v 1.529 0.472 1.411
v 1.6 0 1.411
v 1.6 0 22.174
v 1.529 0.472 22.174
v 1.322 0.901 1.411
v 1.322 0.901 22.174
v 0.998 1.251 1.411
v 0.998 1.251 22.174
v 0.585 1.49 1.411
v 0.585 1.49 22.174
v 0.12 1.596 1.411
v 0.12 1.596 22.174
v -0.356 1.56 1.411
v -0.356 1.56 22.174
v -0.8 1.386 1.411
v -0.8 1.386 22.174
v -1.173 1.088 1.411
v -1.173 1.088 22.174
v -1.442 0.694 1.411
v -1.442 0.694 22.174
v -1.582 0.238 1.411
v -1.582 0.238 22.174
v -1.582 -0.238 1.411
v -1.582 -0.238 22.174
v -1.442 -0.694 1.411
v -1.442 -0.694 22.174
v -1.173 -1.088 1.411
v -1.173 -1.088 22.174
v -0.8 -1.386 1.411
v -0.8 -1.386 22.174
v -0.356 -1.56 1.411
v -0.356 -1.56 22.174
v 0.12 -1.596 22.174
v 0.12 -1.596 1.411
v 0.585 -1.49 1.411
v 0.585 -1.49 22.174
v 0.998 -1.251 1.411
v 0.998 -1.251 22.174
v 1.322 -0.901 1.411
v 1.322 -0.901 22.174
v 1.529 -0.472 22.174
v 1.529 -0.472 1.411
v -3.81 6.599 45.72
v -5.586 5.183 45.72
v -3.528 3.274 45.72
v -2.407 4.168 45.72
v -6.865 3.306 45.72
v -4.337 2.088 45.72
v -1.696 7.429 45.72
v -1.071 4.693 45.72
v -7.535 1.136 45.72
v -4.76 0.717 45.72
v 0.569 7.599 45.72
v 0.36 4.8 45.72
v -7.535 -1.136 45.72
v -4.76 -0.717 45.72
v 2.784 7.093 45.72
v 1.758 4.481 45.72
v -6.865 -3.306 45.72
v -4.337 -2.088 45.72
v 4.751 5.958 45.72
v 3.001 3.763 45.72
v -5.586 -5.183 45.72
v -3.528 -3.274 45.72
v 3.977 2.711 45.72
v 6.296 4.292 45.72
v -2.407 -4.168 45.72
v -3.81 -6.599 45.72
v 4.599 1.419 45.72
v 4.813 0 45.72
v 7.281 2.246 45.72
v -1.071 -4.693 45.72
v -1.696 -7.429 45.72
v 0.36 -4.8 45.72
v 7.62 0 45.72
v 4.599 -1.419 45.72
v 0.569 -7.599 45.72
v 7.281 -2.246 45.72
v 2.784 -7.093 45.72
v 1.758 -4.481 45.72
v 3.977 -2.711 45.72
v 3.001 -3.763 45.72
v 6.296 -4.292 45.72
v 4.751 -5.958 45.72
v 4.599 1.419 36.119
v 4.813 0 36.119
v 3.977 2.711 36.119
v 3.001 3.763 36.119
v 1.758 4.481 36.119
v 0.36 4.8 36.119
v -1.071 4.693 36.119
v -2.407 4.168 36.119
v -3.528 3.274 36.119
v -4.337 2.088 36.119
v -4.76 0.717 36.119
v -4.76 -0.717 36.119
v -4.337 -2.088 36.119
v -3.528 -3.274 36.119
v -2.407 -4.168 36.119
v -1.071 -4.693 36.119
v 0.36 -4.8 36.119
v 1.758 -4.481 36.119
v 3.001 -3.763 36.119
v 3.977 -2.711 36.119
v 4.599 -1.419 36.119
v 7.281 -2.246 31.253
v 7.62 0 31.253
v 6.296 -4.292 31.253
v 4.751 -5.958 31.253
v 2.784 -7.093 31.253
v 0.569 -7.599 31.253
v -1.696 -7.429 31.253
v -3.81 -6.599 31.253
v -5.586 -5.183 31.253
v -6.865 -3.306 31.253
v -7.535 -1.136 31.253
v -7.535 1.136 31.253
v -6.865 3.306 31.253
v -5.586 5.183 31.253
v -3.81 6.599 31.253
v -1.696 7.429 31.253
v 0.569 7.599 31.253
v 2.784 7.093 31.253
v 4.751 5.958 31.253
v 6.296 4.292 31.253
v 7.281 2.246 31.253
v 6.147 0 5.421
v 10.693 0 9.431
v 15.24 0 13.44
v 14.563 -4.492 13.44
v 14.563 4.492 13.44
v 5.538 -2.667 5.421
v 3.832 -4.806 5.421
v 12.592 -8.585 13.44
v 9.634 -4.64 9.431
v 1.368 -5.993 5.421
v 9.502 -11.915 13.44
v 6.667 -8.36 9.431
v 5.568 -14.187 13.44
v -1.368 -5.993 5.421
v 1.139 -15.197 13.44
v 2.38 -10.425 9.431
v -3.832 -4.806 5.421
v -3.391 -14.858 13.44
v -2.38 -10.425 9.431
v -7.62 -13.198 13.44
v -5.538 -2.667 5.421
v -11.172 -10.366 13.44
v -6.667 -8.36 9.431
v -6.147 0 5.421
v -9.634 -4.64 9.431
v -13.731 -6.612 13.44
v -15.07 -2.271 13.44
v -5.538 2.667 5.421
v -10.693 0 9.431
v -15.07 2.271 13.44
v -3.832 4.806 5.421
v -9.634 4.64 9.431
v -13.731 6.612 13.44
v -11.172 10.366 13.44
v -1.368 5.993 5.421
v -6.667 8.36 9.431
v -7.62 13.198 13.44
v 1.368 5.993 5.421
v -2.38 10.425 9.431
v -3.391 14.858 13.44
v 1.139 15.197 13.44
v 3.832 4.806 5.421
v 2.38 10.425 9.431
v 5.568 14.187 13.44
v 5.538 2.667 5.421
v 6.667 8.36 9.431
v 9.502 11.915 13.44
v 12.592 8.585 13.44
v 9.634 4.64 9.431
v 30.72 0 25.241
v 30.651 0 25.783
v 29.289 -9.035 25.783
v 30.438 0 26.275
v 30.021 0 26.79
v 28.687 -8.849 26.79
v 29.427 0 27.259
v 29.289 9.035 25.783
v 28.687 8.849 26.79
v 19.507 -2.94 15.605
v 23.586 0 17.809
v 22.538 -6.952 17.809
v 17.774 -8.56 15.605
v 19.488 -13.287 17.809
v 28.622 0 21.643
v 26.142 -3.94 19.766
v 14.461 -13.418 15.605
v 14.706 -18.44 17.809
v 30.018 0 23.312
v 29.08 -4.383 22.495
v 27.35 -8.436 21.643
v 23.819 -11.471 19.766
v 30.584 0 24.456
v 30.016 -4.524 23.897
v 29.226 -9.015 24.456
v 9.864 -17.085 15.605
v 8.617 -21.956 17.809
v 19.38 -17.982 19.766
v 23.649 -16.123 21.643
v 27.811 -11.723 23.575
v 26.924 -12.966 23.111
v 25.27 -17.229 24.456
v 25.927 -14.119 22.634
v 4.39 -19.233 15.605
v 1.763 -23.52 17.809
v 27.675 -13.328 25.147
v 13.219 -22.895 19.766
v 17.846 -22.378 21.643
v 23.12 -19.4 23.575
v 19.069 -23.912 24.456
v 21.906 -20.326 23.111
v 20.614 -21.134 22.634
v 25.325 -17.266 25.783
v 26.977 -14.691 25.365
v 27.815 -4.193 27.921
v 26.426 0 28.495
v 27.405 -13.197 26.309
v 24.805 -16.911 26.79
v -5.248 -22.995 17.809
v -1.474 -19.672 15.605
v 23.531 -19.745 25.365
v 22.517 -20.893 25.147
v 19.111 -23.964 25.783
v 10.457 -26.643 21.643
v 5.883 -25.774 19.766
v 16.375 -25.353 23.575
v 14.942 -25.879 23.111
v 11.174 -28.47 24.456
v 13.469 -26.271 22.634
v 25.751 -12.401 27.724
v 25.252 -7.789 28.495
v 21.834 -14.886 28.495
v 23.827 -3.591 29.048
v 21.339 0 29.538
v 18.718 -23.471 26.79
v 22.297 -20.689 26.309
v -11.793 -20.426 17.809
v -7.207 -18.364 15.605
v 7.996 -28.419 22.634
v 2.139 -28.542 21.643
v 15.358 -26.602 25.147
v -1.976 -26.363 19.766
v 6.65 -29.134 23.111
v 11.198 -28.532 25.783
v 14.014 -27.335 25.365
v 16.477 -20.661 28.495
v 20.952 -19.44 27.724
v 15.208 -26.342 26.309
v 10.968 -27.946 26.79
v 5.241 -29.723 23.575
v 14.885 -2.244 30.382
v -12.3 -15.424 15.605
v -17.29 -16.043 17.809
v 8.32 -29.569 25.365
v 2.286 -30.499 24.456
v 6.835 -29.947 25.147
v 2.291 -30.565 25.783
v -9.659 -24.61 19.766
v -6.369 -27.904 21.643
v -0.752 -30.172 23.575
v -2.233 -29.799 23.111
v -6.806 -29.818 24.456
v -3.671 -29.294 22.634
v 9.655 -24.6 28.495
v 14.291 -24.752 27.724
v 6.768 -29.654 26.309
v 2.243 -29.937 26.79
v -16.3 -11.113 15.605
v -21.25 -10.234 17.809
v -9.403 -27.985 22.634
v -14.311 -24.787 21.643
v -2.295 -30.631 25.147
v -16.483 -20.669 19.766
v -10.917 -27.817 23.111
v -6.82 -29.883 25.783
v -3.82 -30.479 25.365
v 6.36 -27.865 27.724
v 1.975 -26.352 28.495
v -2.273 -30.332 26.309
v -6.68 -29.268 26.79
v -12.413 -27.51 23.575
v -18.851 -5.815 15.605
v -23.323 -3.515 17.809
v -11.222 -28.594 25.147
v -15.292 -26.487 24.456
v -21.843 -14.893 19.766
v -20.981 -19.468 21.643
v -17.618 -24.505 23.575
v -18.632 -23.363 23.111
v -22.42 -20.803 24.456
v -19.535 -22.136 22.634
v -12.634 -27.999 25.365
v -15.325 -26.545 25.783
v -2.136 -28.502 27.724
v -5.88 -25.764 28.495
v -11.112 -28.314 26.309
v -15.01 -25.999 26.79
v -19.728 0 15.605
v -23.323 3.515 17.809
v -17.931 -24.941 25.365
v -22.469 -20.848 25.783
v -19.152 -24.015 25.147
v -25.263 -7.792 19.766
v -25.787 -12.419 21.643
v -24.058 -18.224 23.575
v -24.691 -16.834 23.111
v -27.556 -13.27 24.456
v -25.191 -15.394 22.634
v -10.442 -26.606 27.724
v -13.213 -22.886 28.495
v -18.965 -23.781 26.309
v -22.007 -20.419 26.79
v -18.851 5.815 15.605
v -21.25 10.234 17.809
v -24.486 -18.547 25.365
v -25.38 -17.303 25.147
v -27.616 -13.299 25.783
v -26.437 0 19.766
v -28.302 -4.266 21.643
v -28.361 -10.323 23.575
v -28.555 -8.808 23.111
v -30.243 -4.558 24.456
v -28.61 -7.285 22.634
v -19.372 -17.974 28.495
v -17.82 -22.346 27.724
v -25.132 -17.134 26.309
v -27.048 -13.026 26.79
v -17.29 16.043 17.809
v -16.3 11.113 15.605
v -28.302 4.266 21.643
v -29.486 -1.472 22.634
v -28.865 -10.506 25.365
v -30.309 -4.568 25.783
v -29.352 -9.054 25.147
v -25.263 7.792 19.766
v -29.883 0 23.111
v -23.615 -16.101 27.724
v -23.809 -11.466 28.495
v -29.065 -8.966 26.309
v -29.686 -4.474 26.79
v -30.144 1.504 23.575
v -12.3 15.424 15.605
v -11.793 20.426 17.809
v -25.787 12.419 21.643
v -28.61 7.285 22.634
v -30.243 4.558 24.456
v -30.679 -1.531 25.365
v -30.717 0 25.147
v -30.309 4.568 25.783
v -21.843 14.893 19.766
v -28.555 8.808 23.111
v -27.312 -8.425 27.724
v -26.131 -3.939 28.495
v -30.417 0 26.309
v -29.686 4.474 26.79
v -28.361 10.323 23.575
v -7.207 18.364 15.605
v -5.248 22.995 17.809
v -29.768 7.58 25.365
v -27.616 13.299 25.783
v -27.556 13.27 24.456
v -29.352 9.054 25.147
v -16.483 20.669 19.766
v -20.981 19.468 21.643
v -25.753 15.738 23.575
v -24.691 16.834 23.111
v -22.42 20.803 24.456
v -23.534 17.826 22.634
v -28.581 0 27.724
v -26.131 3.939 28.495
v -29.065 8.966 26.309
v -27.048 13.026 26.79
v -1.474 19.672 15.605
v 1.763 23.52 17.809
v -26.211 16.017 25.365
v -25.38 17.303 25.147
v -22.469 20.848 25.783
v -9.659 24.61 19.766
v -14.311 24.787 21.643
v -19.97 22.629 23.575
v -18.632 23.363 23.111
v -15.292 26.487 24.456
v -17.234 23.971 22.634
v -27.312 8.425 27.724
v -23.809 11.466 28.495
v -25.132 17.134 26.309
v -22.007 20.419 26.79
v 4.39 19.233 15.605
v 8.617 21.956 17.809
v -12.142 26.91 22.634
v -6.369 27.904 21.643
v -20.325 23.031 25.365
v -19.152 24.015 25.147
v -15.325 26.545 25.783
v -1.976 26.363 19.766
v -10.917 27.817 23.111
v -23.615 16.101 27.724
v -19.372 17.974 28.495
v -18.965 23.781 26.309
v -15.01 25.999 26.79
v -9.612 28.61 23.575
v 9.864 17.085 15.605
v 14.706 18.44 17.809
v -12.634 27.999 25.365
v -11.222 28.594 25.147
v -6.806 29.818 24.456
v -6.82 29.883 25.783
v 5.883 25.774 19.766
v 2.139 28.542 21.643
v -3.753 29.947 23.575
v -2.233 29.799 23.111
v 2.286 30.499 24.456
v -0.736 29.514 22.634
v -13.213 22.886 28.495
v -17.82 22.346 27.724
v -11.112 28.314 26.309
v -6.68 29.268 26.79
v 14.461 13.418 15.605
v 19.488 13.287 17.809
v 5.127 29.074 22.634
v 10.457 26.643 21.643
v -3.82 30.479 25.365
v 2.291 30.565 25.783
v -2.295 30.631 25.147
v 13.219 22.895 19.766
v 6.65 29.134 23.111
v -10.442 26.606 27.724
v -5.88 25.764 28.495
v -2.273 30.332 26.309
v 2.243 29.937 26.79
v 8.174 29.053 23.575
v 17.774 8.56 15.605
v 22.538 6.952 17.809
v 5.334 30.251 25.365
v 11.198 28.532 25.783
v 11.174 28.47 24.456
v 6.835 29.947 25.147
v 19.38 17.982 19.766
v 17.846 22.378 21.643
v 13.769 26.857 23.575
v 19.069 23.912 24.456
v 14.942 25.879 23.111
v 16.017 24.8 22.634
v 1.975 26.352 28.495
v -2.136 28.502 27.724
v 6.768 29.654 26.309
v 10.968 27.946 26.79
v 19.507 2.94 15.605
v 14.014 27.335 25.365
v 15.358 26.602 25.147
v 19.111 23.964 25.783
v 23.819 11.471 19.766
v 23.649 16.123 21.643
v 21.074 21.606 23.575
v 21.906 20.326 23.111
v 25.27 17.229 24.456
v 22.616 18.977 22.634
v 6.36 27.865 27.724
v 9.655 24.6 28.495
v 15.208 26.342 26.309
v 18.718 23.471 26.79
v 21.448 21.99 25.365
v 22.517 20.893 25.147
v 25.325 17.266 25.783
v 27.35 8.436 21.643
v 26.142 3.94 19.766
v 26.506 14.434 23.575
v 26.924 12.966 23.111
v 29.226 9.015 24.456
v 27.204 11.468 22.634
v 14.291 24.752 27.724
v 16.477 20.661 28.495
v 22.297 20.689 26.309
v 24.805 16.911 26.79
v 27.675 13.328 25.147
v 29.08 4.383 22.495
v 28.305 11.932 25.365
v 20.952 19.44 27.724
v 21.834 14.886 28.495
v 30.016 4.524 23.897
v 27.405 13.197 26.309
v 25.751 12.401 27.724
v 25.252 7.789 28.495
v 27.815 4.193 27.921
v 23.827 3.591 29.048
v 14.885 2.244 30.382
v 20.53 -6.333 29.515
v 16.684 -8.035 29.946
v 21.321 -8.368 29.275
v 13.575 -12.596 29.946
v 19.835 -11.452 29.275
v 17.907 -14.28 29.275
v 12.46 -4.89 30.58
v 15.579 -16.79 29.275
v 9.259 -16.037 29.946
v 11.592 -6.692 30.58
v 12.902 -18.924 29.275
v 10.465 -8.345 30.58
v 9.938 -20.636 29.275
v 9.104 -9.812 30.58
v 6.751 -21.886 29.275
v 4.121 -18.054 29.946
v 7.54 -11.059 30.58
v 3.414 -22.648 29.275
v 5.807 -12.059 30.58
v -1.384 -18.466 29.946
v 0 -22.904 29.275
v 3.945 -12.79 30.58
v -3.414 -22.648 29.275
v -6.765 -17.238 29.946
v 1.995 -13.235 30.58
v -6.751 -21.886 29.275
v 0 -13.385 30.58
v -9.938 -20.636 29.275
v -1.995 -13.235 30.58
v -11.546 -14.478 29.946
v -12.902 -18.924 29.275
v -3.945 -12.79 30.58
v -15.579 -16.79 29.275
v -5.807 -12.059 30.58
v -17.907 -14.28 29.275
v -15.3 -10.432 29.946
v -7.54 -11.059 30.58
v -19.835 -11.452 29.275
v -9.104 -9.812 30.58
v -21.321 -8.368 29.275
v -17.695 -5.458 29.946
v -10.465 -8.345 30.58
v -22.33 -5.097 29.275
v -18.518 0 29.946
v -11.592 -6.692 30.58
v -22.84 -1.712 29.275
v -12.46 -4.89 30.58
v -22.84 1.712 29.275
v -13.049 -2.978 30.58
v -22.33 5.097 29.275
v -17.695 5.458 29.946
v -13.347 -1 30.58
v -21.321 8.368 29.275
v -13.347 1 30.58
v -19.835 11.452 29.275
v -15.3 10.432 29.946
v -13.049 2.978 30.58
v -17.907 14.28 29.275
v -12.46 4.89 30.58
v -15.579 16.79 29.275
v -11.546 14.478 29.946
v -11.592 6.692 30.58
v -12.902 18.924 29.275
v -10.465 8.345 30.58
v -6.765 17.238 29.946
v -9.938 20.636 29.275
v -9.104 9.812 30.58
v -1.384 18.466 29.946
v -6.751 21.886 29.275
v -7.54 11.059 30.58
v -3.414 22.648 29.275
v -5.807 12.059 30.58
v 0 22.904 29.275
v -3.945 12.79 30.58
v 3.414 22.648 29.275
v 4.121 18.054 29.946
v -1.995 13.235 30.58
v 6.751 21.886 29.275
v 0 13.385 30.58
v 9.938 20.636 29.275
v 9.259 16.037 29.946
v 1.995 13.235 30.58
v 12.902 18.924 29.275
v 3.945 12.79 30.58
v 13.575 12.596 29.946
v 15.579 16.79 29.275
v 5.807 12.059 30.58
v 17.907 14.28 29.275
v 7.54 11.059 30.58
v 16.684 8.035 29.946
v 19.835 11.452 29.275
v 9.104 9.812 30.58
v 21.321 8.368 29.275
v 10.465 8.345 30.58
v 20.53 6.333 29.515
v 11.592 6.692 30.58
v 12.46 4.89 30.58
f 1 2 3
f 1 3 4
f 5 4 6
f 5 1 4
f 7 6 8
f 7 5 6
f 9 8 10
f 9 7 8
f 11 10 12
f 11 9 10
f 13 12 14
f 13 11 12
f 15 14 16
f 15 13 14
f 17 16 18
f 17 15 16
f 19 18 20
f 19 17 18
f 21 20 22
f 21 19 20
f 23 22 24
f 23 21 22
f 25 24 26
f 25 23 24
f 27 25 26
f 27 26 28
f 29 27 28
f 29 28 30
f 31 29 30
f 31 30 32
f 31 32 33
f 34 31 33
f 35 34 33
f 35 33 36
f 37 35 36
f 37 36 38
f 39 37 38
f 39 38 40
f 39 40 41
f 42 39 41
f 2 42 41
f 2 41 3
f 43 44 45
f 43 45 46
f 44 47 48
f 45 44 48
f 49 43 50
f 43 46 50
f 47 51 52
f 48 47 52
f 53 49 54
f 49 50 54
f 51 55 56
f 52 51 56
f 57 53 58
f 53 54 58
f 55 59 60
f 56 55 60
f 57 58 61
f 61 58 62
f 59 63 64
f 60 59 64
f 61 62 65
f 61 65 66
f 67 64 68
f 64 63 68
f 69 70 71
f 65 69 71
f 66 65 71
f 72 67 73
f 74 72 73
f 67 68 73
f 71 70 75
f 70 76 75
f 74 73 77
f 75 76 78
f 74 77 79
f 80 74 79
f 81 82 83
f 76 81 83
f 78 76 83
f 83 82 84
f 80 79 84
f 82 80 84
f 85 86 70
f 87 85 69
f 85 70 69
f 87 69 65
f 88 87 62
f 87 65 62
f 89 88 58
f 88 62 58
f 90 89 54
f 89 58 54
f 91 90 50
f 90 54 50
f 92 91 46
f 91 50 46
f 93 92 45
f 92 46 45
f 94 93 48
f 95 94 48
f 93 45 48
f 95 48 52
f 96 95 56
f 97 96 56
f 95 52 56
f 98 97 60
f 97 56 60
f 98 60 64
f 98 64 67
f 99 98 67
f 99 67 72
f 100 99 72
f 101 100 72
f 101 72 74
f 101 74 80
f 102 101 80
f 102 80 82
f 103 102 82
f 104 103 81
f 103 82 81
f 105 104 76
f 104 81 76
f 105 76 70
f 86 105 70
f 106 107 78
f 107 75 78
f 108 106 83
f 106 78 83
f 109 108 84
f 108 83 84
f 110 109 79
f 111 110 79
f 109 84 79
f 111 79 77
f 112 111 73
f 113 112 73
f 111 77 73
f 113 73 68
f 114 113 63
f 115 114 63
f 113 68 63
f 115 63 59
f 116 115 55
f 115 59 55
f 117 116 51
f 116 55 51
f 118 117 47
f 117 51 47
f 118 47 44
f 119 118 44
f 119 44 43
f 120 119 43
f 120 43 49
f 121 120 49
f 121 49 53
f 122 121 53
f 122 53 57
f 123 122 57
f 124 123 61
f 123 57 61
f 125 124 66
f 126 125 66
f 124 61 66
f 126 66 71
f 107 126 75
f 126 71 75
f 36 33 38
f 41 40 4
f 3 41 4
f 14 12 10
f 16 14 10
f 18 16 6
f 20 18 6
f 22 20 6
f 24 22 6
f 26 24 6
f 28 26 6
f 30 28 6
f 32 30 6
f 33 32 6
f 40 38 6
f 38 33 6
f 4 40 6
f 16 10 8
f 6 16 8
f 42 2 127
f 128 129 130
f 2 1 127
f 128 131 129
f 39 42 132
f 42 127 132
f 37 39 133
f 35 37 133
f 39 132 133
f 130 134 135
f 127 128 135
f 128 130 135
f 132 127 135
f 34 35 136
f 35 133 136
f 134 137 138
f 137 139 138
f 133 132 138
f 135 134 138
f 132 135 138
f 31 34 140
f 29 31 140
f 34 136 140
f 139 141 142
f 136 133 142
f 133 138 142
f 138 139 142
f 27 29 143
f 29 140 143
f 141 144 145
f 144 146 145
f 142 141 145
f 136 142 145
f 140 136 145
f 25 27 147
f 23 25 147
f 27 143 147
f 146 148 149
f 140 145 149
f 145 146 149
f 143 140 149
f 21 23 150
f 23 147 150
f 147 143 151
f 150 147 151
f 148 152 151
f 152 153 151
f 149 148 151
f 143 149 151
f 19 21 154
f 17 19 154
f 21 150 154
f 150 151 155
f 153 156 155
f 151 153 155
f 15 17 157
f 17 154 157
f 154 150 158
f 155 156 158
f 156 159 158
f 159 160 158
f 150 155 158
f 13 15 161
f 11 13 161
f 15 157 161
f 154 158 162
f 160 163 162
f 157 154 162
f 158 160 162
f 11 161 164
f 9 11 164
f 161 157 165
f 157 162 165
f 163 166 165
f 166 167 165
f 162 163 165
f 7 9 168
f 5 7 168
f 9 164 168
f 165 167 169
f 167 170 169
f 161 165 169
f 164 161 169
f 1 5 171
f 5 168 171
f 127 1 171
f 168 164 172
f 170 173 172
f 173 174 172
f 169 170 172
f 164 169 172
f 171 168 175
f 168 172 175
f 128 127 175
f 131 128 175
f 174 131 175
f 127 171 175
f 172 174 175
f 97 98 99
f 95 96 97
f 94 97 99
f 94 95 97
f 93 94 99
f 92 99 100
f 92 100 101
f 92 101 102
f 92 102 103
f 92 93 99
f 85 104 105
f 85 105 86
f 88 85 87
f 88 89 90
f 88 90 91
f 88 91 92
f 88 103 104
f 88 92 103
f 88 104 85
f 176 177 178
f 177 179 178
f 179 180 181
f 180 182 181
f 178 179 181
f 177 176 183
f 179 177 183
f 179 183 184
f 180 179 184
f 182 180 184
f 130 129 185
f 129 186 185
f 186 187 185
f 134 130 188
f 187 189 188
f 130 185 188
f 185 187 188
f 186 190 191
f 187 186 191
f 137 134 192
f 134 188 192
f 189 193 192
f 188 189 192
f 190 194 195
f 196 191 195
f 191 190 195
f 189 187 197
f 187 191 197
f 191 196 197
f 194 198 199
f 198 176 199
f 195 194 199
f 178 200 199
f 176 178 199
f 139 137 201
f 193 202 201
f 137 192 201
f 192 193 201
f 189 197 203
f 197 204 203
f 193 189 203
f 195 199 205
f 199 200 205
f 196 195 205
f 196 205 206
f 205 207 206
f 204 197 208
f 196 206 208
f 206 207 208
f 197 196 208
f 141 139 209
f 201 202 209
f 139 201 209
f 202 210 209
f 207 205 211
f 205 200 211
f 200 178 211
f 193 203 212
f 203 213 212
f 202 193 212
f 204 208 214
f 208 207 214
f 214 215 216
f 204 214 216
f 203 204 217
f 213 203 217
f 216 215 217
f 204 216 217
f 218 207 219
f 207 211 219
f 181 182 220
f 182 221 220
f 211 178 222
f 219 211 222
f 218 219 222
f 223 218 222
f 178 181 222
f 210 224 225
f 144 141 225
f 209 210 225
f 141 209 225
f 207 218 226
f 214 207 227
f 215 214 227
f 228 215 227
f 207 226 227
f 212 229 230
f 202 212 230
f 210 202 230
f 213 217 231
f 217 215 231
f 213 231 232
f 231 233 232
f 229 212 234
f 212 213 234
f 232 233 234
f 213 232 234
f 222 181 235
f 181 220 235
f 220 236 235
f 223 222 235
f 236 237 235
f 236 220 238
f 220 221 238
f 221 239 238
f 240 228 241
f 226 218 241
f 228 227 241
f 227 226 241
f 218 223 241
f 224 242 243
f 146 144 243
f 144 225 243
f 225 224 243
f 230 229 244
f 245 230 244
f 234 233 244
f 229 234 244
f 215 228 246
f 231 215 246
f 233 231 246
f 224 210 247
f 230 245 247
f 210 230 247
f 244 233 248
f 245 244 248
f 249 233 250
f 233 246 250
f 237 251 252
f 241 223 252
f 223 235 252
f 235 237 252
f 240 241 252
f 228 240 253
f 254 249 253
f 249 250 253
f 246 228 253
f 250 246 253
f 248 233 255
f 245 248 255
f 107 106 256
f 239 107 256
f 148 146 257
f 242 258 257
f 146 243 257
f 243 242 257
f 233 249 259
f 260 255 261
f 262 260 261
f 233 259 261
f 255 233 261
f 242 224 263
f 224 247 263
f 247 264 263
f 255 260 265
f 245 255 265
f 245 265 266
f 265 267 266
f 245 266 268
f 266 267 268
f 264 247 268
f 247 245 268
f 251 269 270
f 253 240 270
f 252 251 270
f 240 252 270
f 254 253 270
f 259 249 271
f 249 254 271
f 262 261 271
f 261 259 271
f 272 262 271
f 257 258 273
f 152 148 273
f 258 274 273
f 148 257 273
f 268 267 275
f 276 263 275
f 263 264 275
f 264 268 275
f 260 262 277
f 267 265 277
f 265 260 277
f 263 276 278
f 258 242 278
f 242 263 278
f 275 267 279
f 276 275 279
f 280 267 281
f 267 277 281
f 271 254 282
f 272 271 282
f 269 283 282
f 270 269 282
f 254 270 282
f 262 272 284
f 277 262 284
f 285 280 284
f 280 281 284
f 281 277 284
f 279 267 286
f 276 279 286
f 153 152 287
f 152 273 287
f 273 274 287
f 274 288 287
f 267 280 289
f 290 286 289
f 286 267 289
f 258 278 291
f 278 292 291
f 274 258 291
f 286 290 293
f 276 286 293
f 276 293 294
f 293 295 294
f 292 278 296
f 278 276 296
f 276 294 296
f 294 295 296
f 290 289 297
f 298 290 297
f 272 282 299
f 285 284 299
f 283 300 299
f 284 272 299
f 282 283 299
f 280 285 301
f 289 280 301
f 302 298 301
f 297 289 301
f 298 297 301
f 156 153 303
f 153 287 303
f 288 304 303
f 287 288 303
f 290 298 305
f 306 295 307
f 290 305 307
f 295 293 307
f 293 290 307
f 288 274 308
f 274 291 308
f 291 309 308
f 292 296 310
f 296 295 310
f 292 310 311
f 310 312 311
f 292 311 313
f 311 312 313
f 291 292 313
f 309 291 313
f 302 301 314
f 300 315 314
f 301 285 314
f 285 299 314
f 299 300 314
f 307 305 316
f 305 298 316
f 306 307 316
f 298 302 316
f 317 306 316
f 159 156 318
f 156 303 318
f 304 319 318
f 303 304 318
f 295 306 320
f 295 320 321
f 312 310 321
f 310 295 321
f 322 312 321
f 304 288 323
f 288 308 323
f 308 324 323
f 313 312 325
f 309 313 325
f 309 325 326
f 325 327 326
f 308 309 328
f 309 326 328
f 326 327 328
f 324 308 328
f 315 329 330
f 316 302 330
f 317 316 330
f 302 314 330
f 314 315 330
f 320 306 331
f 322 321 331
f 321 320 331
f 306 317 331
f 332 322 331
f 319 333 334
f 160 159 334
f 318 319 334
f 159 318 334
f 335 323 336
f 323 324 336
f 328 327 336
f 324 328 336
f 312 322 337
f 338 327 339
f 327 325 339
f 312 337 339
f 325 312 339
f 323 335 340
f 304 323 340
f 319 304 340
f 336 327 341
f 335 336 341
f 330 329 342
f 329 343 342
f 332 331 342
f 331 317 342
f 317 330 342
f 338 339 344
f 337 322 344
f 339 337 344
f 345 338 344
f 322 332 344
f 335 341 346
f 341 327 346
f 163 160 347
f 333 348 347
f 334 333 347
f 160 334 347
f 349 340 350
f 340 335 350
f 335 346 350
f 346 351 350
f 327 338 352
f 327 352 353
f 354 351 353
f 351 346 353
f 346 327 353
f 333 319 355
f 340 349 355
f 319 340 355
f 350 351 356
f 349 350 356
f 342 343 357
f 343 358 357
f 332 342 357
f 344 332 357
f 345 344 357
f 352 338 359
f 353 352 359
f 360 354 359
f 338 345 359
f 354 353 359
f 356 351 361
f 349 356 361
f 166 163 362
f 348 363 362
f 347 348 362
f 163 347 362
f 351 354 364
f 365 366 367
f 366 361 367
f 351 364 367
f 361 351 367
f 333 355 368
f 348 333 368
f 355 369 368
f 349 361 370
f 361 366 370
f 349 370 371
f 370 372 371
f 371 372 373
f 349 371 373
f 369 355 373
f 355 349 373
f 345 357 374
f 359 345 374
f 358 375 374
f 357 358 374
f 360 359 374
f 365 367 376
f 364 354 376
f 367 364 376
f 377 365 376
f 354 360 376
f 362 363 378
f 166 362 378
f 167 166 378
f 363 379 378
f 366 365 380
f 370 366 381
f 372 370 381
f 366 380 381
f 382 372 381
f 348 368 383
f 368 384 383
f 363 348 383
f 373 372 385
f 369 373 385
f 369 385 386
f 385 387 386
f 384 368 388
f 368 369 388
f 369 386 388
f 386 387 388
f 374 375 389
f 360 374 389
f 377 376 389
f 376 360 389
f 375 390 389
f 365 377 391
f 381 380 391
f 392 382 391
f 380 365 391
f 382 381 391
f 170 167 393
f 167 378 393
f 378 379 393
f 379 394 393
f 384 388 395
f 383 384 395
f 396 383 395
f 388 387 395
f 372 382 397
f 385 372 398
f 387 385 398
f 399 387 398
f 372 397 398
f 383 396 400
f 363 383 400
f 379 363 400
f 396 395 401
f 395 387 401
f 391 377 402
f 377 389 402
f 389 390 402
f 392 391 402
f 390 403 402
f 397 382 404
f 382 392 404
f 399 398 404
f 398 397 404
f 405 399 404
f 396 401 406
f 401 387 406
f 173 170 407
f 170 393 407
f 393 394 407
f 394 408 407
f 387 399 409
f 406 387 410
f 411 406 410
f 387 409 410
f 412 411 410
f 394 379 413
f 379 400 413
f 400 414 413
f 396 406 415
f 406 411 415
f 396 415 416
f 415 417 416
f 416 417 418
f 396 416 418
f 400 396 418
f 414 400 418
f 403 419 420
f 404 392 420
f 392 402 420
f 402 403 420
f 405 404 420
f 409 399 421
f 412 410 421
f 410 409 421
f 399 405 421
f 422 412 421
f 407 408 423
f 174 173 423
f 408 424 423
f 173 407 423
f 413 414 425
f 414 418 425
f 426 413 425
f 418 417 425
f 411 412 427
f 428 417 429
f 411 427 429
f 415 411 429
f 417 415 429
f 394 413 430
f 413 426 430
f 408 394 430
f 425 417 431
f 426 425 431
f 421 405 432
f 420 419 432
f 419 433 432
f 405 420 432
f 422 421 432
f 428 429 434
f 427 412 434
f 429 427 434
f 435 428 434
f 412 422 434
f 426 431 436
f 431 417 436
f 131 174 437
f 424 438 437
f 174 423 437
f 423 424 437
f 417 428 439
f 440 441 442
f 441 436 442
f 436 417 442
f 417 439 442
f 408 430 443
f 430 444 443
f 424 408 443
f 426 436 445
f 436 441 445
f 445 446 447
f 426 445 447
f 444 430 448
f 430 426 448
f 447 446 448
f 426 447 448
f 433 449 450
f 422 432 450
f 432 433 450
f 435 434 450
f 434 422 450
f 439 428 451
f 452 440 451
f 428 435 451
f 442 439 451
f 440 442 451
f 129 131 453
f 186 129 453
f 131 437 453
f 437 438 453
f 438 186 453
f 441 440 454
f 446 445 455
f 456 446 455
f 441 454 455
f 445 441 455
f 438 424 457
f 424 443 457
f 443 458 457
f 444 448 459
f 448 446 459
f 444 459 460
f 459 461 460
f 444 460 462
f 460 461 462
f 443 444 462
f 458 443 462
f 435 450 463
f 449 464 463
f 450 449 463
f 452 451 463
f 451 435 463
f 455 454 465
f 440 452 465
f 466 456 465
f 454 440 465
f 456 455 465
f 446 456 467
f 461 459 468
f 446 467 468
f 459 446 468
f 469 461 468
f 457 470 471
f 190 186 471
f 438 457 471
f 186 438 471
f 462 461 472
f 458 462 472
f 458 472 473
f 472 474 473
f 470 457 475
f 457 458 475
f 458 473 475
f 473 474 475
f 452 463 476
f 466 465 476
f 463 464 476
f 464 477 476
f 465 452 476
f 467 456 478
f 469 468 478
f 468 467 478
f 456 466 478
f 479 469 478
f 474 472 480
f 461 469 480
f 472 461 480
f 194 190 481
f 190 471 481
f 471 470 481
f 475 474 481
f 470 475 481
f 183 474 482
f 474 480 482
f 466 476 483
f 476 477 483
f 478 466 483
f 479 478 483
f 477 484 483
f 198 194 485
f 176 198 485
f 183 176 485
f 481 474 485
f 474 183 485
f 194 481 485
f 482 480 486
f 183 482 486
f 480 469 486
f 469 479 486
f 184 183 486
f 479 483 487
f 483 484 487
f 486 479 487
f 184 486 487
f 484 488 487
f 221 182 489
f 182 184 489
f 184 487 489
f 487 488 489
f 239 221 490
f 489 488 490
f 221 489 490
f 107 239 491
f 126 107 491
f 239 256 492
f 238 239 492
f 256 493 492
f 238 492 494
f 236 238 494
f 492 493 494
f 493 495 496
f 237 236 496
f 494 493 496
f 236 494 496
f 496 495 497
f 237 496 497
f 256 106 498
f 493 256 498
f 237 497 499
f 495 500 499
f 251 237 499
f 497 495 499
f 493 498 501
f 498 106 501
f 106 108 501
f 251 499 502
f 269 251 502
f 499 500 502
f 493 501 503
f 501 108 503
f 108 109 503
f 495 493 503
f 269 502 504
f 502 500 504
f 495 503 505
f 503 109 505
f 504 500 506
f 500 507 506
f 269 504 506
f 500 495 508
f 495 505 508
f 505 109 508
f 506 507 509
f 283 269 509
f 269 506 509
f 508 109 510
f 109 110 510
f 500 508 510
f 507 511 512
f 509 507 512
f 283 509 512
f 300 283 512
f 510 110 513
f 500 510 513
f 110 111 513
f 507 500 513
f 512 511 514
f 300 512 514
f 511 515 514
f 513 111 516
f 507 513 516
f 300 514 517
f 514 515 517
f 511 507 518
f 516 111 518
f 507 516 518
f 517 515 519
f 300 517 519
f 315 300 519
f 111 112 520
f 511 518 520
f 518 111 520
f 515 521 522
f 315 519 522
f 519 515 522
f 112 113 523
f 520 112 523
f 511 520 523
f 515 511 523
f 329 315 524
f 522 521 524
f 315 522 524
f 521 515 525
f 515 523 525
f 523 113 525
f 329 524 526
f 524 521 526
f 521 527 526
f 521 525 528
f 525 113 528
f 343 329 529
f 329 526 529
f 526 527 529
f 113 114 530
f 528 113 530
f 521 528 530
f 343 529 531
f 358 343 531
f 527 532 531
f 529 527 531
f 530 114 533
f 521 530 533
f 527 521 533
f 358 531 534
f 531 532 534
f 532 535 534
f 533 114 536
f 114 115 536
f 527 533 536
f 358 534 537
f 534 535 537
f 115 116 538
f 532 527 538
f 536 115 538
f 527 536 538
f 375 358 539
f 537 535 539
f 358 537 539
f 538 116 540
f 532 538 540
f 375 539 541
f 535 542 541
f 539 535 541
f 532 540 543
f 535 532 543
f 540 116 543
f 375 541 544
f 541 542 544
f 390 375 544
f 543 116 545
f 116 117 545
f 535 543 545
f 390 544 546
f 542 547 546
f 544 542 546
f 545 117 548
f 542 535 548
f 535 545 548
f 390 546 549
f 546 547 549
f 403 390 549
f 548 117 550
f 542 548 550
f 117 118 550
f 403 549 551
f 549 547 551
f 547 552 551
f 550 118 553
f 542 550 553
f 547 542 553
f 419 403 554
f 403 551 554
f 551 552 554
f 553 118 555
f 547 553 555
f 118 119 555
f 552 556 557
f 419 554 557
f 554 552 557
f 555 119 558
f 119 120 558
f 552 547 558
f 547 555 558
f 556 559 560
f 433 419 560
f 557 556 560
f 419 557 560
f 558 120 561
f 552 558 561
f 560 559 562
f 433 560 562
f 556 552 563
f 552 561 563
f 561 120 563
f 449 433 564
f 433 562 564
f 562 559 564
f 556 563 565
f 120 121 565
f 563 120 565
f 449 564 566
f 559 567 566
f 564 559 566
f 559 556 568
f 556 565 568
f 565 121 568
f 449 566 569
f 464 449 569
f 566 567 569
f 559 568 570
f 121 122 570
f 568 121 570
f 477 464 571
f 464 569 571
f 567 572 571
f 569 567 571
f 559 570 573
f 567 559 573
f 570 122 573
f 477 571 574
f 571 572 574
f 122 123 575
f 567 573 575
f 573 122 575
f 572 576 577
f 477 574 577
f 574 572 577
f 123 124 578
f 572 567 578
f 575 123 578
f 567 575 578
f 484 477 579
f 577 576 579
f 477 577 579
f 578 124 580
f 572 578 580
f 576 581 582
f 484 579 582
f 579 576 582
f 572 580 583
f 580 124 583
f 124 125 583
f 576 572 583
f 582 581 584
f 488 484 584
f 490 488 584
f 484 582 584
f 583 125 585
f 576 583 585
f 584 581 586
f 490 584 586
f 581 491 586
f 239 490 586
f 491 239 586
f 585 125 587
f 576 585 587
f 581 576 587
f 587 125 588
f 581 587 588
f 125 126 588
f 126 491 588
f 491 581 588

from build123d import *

# Parameters (mm, degrees)
F2_R     = 4.8133
F3_DEPTH = 9.6012
F4_R     = 1.6002
F5_DEPTH = 22.1742


with BuildPart() as f1:
    # F0 (on Front) → F1 (revolve)
    with BuildSketch(Plane.XZ):
        with BuildLine():
            add(Edge.make_bspline(
                [(15.24, 13.4404166602), (24.9512382846, 17.761113573), (38.4288212127, 28.2685653314), (20.5129507573, 29.7235381078), (7.62, 31.2529022536)],
                knots=[0, 0, 0, 0, 0.4770419895, 1, 1, 1, 1], degree=3))
            Line((7.62, 31.2529022536), (7.62, 45.72))
            Line((7.62, 45.72), (0, 45.72))
            Line((0, 45.72), (0, 0))
            Line((0, 0), (15.24, 13.4404166602))
        make_face()
    revolve(axis=Axis((0, 0, 22.86), (0, 0, -1)))

    # F2 (on face) → F3 (cut)
    with BuildSketch(Plane.XY.offset(45.72)):
        Circle(F2_R)
    extrude(amount=-F3_DEPTH, mode=Mode.SUBTRACT)

    # F4 (on Top) → F5 (cut)
    with BuildSketch(Plane.XY):
        Circle(F4_R)
    extrude(amount=F5_DEPTH, mode=Mode.SUBTRACT)


solid = f1.part
